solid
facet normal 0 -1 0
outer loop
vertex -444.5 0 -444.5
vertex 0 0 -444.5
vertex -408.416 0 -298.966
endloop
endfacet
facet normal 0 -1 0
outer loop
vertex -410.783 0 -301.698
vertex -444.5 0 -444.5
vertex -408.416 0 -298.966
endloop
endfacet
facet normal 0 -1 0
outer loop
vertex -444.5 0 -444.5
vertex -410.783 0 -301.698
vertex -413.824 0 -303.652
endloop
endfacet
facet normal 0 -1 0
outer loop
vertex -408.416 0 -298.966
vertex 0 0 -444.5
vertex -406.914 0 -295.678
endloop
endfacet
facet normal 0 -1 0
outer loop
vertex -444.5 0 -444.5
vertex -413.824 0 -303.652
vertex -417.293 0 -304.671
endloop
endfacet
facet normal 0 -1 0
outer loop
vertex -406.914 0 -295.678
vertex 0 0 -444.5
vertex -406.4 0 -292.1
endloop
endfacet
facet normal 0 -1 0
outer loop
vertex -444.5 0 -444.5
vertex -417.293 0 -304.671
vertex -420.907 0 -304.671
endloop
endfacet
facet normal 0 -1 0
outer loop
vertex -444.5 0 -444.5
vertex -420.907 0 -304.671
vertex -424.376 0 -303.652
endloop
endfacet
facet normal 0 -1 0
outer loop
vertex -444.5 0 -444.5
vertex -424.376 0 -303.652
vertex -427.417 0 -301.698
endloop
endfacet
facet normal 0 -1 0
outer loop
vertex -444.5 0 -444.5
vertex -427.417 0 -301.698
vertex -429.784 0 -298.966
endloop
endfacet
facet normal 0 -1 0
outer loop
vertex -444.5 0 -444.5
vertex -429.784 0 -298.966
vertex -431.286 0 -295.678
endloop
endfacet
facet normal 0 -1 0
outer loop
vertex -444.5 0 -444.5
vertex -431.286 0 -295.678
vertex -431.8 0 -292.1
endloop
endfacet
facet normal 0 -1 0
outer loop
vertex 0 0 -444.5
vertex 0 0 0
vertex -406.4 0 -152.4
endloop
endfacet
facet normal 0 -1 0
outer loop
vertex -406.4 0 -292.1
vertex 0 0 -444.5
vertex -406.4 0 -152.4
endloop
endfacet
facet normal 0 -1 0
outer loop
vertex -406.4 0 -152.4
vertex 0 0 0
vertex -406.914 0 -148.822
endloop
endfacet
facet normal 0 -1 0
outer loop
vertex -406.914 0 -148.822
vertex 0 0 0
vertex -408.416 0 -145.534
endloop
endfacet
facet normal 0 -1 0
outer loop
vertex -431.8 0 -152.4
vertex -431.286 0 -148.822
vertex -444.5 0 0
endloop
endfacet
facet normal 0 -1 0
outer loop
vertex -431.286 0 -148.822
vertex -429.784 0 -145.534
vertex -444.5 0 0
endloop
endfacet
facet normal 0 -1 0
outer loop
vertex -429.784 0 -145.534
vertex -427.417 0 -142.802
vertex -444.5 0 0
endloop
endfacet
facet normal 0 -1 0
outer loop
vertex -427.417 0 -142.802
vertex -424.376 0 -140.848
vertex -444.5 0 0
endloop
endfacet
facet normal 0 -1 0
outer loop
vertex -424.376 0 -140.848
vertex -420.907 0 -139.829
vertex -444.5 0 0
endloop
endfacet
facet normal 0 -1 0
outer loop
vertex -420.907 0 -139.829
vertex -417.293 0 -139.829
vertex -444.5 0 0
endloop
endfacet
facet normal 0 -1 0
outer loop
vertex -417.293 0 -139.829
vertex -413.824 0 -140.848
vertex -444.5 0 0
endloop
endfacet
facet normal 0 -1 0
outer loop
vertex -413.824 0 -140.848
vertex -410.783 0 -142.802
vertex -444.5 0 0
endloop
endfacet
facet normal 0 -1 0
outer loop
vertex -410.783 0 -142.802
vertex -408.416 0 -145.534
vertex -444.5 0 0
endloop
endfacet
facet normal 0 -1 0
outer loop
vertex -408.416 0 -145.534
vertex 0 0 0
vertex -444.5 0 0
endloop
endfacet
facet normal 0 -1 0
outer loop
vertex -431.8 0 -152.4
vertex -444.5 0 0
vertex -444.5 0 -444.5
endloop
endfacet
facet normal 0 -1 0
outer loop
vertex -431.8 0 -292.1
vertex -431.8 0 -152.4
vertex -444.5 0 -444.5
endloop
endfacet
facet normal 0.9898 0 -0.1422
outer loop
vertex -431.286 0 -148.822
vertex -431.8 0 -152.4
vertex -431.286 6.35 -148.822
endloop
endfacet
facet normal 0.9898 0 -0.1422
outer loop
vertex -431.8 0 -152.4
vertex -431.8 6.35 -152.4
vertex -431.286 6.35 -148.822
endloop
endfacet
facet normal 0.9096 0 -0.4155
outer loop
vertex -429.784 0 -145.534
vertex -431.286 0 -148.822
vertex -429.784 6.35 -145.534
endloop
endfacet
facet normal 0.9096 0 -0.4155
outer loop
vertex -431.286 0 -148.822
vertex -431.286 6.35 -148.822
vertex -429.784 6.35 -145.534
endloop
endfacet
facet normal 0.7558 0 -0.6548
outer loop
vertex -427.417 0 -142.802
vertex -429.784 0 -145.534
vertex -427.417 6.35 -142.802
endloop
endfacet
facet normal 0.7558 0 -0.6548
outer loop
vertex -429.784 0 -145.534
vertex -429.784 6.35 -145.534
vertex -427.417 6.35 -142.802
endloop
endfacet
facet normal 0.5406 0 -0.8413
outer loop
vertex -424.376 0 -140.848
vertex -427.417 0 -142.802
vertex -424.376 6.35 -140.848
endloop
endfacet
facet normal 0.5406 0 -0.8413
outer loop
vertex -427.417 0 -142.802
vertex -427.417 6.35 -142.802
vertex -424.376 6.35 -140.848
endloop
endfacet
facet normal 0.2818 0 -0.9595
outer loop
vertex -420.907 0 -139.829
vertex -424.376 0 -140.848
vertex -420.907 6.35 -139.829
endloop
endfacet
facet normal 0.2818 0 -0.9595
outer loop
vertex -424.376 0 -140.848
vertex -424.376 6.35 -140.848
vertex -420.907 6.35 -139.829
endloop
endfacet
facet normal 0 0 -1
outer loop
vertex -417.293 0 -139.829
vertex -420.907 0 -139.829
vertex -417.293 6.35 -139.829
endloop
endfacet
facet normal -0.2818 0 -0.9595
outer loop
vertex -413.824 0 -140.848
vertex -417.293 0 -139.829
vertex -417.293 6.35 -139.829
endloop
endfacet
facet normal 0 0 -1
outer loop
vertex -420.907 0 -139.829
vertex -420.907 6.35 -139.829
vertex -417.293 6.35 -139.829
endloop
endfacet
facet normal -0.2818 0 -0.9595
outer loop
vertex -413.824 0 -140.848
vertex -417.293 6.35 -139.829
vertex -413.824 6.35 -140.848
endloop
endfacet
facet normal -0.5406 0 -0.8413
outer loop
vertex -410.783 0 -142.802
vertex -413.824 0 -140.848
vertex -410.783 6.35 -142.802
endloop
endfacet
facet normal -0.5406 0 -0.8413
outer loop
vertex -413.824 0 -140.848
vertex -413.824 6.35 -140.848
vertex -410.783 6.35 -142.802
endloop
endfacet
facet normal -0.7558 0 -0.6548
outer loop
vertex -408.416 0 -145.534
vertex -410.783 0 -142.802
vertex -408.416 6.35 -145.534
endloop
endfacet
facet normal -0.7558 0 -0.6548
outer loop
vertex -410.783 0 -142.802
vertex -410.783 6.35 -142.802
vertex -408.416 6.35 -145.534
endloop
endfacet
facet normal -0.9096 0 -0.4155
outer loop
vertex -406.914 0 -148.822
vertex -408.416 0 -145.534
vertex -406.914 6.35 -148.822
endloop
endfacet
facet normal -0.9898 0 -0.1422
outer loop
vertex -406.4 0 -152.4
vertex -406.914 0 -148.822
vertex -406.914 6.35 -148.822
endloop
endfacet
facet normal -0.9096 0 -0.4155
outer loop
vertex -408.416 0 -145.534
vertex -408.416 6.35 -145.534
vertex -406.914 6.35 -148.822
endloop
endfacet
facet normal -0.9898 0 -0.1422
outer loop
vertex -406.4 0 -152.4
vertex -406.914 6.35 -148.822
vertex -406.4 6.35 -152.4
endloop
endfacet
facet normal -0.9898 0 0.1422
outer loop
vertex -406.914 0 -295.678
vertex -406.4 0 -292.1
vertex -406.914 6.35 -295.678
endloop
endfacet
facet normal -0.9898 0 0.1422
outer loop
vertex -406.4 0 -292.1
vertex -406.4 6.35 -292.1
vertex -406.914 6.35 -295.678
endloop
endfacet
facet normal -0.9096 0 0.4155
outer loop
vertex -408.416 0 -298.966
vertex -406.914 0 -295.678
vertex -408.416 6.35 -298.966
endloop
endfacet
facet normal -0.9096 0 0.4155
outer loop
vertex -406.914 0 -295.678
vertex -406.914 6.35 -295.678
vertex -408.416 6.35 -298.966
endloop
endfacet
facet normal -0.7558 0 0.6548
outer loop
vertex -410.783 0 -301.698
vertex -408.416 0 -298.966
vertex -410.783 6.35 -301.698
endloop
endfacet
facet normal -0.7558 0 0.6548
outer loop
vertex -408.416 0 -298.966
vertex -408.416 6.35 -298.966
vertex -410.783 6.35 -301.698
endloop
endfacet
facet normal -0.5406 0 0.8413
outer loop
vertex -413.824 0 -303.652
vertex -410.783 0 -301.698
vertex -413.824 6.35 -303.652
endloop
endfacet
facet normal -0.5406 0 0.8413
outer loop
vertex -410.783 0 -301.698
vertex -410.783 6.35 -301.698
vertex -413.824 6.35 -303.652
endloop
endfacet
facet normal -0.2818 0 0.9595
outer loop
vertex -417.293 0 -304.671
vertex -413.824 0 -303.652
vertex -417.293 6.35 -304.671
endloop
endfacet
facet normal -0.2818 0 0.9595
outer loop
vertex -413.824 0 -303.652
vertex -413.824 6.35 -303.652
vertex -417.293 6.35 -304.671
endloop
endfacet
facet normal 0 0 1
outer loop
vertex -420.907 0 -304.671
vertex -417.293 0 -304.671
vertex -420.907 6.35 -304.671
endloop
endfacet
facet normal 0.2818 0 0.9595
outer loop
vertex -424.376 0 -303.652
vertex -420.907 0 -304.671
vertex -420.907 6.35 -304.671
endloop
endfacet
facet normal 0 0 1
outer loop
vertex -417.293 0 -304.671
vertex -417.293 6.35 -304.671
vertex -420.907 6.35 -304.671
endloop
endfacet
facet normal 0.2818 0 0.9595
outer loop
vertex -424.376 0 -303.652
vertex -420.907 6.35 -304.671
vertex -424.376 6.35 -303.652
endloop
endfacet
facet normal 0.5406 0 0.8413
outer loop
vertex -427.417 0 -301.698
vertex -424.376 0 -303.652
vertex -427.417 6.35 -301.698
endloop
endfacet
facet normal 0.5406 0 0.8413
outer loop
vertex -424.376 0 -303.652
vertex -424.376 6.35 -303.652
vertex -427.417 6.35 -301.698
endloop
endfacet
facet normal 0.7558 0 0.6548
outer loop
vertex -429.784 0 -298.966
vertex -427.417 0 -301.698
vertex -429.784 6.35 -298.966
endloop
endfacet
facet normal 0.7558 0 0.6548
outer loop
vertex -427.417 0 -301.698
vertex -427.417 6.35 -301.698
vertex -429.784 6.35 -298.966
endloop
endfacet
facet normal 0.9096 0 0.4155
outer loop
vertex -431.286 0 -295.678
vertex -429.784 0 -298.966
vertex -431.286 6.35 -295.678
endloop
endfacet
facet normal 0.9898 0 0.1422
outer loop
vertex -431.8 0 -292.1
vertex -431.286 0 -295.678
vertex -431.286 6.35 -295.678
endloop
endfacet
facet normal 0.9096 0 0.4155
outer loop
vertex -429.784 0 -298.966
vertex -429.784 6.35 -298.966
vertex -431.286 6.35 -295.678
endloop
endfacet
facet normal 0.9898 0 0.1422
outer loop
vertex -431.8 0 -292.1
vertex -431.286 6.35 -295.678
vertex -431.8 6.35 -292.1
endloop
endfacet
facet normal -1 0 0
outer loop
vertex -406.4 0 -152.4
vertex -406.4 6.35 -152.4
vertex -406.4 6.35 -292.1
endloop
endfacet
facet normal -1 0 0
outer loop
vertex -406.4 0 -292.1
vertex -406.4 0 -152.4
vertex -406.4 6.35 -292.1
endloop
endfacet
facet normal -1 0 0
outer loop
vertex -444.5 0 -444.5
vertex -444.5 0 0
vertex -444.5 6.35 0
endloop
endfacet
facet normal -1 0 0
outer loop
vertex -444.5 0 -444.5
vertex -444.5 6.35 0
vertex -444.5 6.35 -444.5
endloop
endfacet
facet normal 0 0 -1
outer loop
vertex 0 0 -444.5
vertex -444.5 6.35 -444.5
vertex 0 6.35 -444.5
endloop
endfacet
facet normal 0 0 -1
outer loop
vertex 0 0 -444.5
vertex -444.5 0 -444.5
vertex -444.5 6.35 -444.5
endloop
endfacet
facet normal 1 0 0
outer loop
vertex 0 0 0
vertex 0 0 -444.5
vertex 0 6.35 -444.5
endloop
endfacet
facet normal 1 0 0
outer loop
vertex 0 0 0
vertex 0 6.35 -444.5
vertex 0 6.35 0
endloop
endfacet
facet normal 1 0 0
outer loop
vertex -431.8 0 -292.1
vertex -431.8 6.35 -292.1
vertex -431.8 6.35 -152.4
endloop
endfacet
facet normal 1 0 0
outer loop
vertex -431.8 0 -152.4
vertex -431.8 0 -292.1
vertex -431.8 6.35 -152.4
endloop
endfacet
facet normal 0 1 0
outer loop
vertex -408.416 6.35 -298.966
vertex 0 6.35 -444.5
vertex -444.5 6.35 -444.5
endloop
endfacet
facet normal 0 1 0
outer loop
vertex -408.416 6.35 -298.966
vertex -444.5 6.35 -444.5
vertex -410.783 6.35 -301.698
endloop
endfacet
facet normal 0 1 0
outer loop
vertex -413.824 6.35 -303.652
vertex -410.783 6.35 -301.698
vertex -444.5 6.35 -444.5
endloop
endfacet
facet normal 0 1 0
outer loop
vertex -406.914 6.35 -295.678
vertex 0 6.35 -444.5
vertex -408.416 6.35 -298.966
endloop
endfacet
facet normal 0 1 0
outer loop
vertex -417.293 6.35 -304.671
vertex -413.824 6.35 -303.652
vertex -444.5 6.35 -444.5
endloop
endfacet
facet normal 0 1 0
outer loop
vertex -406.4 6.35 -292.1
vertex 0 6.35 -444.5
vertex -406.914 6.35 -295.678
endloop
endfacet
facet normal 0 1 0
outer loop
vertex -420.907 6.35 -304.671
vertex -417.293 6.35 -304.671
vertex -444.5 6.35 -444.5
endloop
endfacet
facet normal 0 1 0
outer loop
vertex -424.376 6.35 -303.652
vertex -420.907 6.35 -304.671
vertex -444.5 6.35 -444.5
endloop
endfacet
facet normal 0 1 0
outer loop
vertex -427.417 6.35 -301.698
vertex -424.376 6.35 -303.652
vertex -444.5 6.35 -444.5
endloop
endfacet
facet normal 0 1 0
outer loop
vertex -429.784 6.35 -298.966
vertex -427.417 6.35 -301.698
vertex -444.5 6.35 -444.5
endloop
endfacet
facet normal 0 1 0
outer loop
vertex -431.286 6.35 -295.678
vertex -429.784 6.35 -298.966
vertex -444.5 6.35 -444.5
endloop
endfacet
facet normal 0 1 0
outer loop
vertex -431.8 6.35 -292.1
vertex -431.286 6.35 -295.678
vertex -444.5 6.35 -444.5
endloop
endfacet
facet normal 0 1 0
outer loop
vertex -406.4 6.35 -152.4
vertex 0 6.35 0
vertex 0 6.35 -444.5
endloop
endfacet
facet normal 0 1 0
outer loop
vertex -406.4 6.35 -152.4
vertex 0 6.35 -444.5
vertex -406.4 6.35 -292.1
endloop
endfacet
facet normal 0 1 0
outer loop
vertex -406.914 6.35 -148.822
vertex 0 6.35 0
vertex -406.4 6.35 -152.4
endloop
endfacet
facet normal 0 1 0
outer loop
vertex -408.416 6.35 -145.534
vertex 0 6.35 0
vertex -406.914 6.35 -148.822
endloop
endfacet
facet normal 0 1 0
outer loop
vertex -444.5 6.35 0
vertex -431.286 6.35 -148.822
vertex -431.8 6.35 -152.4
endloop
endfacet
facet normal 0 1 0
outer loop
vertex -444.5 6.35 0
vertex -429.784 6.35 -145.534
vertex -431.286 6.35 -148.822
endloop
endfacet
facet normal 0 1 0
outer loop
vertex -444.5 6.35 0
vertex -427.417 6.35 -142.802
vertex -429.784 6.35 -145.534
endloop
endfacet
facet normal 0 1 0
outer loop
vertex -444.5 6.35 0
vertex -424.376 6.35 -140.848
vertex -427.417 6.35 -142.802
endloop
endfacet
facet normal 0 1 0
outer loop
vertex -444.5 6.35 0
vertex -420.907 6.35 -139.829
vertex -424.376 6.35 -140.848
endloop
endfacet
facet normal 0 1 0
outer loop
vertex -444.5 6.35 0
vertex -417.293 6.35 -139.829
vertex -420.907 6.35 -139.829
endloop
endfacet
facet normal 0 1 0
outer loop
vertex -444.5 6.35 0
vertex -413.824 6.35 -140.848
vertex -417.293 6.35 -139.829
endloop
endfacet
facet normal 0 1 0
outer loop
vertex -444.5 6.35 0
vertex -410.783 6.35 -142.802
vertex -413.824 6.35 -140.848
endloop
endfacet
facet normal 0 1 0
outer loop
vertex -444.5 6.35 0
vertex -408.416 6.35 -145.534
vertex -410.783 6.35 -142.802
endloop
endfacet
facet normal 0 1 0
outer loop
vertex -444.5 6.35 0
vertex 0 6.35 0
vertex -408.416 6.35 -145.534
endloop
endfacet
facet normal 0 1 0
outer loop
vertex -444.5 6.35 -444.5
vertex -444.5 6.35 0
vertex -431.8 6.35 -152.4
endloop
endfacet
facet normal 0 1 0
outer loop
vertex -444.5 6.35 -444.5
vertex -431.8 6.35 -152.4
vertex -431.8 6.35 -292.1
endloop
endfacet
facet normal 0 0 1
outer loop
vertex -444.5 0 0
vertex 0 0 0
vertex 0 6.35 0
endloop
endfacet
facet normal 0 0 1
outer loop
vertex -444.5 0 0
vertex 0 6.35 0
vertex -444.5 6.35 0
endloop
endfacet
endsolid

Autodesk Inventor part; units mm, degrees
ref_plane "YZ Plane" through (0, 0, 0) normal (1, 0, 0) x (0, 1, 0)
ref_plane "XZ Plane" through (0, 0, 0) normal (0, 1, 0) x (-1, 0, 0)
ref_plane "XY Plane" through (0, 0, 0) normal (0, 0, 1) x (1, 0, 0)
sketch "Sketch1" plane through (0, 0, 0) normal (0, 1, 0) x (-1, 0, 0)
  line L0 (0, 0) -> (444.5, 0)
  line L1 (444.5, 0) -> (444.5, -444.5)
  line L2 (444.5, -444.5) -> (0, -444.5)
  line L3 (0, -444.5) -> (0, 0)
  dimension "d0" = 444.5
  dimension "d1" = 444.5
extrude "Extrusion1" add sketch "Sketch1" along normal blind 6.35
sketch "Sketch2" plane through (0, 6.35, 0) normal (0, 1, 0) x (1, 0, 0)
  line L0 (-444.5, 0) -> (0, 0) projected
  line L1 (-444.5, 444.5) -> (-444.5, 0) projected
  line L2 (-419.1, 304.8) -> (-419.1, 139.7) construction
  line L3 (-431.8, 292.1) -> (-431.8, 152.4)
  line L4 (-406.4, 152.4) -> (-406.4, 292.1)
  arc A0 (-406.4, 292.1) -> (-431.8, 292.1) centre (-419.1, 292.1) ccw
  arc A1 (-431.8, 152.4) -> (-406.4, 152.4) centre (-419.1, 152.4) ccw
  line L5 (0, 444.5) -> (-444.5, 444.5) projected
  point P0 (-419.1, 222.25)
  dimension "d8" = 444.5
  dimension "d12" = 25.4
  dimension "d13" = 12.7
  dimension "d14" = 165.1
  dimension "d15" = 139.7
extrude "Extrusion3" cut sketch "Sketch2" against normal through all
equation "\"d15\" = -0.5 * d14 + 0.5 * d8"
properties part number "Top Plate" material "Nylon 6/6"
